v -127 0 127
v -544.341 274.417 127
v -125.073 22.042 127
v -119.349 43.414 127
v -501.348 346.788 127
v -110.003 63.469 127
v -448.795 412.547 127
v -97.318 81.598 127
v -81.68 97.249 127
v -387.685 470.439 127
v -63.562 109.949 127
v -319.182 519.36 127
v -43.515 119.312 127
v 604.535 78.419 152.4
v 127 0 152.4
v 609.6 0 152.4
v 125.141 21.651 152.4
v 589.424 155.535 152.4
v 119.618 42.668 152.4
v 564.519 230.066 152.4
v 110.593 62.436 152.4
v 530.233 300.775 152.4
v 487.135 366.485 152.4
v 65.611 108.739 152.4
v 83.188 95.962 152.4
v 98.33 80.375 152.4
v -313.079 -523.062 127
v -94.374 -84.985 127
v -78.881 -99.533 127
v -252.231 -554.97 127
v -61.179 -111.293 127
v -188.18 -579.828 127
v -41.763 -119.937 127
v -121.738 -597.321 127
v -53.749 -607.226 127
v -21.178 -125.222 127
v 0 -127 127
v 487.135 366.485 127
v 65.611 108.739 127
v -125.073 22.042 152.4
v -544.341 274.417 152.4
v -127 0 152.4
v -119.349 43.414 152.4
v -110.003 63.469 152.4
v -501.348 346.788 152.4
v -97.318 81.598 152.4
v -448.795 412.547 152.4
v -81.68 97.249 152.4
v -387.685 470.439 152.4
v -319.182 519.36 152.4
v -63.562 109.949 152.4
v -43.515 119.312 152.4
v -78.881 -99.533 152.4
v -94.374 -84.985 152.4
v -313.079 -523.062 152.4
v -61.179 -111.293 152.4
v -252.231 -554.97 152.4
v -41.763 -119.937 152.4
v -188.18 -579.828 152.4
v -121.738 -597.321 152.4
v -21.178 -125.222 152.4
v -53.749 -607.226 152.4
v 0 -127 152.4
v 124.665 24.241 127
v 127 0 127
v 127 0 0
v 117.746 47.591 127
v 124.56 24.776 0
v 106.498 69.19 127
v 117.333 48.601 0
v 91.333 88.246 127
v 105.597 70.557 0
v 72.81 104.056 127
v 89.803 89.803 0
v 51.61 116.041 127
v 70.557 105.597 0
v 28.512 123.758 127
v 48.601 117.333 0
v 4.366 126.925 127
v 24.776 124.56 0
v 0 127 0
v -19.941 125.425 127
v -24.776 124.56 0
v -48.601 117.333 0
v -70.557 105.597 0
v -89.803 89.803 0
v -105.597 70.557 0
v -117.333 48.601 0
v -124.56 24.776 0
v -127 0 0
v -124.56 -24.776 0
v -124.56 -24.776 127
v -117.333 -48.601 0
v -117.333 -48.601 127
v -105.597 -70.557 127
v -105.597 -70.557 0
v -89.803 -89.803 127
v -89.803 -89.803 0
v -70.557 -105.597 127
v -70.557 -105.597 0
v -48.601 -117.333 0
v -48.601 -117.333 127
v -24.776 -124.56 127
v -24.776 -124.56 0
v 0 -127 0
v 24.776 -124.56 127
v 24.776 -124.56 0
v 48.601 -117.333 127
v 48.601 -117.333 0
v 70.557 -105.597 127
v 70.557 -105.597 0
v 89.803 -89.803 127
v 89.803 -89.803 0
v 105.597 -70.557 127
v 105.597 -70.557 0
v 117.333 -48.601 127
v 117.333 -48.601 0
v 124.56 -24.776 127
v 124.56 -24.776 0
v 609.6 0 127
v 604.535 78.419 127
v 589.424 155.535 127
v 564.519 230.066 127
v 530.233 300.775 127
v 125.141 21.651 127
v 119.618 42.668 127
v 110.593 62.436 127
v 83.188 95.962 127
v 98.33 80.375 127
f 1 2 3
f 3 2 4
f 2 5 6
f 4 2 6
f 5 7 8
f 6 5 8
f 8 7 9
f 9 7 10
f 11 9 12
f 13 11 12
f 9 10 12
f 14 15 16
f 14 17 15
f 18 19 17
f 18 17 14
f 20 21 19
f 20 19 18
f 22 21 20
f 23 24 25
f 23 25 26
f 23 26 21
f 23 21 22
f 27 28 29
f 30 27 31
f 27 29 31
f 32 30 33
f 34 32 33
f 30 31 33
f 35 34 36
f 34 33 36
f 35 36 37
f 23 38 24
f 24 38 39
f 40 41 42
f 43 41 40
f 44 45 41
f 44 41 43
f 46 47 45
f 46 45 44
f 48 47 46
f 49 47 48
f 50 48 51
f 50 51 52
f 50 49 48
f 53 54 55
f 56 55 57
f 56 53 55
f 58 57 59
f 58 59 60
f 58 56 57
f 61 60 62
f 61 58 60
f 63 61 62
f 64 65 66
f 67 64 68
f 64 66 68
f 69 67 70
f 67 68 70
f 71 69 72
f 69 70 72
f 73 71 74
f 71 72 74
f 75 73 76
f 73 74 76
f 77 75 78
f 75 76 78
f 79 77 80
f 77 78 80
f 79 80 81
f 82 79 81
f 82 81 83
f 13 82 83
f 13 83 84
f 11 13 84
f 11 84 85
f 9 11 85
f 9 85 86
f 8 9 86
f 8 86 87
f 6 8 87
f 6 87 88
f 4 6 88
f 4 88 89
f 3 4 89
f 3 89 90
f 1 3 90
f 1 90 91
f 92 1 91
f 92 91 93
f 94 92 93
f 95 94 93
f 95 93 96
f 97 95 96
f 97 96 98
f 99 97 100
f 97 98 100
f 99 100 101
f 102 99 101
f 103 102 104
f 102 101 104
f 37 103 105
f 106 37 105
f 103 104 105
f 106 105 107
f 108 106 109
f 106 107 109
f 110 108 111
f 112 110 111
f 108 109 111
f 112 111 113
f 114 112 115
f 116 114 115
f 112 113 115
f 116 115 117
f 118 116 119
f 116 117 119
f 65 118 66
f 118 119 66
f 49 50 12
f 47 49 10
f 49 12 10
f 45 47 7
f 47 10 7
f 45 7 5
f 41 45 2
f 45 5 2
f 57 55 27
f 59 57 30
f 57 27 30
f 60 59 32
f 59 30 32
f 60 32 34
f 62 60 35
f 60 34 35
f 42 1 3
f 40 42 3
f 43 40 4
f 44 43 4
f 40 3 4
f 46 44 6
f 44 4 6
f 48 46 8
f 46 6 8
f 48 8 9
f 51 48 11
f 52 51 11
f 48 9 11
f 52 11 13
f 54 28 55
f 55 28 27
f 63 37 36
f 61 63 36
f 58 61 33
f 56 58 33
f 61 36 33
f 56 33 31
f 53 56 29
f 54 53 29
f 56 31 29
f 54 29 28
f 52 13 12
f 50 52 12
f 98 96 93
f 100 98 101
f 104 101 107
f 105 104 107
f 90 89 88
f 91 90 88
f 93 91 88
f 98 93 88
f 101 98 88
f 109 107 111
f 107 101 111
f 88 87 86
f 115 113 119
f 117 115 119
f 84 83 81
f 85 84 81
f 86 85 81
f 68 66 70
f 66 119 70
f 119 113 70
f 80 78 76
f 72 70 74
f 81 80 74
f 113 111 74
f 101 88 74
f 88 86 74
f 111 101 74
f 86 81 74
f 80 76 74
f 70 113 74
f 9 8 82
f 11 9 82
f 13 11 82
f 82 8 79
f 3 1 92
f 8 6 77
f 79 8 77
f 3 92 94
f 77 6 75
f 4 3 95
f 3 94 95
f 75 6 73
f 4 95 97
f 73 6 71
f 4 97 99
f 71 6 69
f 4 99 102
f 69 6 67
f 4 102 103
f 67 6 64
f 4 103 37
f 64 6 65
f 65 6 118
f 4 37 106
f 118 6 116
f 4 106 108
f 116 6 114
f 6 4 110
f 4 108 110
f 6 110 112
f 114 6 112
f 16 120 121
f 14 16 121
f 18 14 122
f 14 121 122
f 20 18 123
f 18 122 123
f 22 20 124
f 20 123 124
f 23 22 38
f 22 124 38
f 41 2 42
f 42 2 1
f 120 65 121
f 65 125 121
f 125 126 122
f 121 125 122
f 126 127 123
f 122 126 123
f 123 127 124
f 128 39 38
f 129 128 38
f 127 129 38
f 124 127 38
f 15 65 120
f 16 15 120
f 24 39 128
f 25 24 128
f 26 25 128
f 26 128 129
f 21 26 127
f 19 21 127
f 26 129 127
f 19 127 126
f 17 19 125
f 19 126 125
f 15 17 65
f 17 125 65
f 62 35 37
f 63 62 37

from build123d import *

# Parameters (mm, degrees)
F0_R     = 127
F1_DEPTH = 127
F2_R     = 609.6
F3_DEPTH = 25.4
F5_DEPTH = 25.4


with BuildPart() as f1:
    # F0 (on Top) → F1 (new body)
    with BuildSketch(Plane.XY):
        Circle(F0_R)
    extrude(amount=F1_DEPTH)

    # F2 (on face) → F3 (join)
    with BuildSketch(Plane.XY.offset(127)):
        Circle(F2_R)
    extrude(amount=F3_DEPTH)

    # F4 (on face) → F5 (cut)
    with BuildSketch(Plane(origin=(0, 0, 127), x_dir=(1, 0, 0), z_dir=(0, 0, -1))):
        with BuildLine():
            ThreePointArc((0, 127), (-51.651949, 116.021878), (-94.374113, 84.985451))
            ThreePointArc((-94.374113, 84.985451), (-118.5633, 45.516413), (-127, 0))
            ThreePointArc((-127, 0), (-104.056224, -72.810042), (-43.514927, -119.31241))
            ThreePointArc((-43.514927, -119.31241), (12.247723, -126.408043), (65.61093, -108.739165))
            ThreePointArc((65.61093, -108.739165), (110.59292, -62.435615), (127, 0))
            ThreePointArc((127, 0), (89.802561, 89.802561), (0, 127))
        make_face()
        with BuildLine():
            ThreePointArc((-127, 0), (-118.5633, 45.516413), (-94.374113, 84.985451))
            Line((-94.374113, 84.985451), (-469.259506, 835.900678))
            ThreePointArc((-469.259506, 835.900678), (-922.532034, 260.516934), (-837.181652, -466.97035))
            Line((-837.181652, -466.97035), (-127, 0))
        make_face()
        with BuildLine():
            Line((-92.576764, 954.129954), (0, 127))
            ThreePointArc((0, 127), (89.802561, 89.802561), (127, 0))
            Line((127, 0), (958.610675, 0))
            ThreePointArc((958.610675, 0), (644.278415, 709.816702), (-92.576764, 954.129954))
        make_face()
        with BuildLine():
            ThreePointArc((65.61093, -108.739165), (12.247723, -126.408043), (-43.514927, -119.31241))
            Line((-43.514927, -119.31241), (-517.387411, -806.997332))
            ThreePointArc((-517.387411, -806.997332), (186.109184, -940.371096), (785.770908, -549.088797))
            Line((785.770908, -549.088797), (65.61093, -108.739165))
        make_face()
    extrude(amount=-F5_DEPTH, mode=Mode.SUBTRACT)


solid = f1.part
